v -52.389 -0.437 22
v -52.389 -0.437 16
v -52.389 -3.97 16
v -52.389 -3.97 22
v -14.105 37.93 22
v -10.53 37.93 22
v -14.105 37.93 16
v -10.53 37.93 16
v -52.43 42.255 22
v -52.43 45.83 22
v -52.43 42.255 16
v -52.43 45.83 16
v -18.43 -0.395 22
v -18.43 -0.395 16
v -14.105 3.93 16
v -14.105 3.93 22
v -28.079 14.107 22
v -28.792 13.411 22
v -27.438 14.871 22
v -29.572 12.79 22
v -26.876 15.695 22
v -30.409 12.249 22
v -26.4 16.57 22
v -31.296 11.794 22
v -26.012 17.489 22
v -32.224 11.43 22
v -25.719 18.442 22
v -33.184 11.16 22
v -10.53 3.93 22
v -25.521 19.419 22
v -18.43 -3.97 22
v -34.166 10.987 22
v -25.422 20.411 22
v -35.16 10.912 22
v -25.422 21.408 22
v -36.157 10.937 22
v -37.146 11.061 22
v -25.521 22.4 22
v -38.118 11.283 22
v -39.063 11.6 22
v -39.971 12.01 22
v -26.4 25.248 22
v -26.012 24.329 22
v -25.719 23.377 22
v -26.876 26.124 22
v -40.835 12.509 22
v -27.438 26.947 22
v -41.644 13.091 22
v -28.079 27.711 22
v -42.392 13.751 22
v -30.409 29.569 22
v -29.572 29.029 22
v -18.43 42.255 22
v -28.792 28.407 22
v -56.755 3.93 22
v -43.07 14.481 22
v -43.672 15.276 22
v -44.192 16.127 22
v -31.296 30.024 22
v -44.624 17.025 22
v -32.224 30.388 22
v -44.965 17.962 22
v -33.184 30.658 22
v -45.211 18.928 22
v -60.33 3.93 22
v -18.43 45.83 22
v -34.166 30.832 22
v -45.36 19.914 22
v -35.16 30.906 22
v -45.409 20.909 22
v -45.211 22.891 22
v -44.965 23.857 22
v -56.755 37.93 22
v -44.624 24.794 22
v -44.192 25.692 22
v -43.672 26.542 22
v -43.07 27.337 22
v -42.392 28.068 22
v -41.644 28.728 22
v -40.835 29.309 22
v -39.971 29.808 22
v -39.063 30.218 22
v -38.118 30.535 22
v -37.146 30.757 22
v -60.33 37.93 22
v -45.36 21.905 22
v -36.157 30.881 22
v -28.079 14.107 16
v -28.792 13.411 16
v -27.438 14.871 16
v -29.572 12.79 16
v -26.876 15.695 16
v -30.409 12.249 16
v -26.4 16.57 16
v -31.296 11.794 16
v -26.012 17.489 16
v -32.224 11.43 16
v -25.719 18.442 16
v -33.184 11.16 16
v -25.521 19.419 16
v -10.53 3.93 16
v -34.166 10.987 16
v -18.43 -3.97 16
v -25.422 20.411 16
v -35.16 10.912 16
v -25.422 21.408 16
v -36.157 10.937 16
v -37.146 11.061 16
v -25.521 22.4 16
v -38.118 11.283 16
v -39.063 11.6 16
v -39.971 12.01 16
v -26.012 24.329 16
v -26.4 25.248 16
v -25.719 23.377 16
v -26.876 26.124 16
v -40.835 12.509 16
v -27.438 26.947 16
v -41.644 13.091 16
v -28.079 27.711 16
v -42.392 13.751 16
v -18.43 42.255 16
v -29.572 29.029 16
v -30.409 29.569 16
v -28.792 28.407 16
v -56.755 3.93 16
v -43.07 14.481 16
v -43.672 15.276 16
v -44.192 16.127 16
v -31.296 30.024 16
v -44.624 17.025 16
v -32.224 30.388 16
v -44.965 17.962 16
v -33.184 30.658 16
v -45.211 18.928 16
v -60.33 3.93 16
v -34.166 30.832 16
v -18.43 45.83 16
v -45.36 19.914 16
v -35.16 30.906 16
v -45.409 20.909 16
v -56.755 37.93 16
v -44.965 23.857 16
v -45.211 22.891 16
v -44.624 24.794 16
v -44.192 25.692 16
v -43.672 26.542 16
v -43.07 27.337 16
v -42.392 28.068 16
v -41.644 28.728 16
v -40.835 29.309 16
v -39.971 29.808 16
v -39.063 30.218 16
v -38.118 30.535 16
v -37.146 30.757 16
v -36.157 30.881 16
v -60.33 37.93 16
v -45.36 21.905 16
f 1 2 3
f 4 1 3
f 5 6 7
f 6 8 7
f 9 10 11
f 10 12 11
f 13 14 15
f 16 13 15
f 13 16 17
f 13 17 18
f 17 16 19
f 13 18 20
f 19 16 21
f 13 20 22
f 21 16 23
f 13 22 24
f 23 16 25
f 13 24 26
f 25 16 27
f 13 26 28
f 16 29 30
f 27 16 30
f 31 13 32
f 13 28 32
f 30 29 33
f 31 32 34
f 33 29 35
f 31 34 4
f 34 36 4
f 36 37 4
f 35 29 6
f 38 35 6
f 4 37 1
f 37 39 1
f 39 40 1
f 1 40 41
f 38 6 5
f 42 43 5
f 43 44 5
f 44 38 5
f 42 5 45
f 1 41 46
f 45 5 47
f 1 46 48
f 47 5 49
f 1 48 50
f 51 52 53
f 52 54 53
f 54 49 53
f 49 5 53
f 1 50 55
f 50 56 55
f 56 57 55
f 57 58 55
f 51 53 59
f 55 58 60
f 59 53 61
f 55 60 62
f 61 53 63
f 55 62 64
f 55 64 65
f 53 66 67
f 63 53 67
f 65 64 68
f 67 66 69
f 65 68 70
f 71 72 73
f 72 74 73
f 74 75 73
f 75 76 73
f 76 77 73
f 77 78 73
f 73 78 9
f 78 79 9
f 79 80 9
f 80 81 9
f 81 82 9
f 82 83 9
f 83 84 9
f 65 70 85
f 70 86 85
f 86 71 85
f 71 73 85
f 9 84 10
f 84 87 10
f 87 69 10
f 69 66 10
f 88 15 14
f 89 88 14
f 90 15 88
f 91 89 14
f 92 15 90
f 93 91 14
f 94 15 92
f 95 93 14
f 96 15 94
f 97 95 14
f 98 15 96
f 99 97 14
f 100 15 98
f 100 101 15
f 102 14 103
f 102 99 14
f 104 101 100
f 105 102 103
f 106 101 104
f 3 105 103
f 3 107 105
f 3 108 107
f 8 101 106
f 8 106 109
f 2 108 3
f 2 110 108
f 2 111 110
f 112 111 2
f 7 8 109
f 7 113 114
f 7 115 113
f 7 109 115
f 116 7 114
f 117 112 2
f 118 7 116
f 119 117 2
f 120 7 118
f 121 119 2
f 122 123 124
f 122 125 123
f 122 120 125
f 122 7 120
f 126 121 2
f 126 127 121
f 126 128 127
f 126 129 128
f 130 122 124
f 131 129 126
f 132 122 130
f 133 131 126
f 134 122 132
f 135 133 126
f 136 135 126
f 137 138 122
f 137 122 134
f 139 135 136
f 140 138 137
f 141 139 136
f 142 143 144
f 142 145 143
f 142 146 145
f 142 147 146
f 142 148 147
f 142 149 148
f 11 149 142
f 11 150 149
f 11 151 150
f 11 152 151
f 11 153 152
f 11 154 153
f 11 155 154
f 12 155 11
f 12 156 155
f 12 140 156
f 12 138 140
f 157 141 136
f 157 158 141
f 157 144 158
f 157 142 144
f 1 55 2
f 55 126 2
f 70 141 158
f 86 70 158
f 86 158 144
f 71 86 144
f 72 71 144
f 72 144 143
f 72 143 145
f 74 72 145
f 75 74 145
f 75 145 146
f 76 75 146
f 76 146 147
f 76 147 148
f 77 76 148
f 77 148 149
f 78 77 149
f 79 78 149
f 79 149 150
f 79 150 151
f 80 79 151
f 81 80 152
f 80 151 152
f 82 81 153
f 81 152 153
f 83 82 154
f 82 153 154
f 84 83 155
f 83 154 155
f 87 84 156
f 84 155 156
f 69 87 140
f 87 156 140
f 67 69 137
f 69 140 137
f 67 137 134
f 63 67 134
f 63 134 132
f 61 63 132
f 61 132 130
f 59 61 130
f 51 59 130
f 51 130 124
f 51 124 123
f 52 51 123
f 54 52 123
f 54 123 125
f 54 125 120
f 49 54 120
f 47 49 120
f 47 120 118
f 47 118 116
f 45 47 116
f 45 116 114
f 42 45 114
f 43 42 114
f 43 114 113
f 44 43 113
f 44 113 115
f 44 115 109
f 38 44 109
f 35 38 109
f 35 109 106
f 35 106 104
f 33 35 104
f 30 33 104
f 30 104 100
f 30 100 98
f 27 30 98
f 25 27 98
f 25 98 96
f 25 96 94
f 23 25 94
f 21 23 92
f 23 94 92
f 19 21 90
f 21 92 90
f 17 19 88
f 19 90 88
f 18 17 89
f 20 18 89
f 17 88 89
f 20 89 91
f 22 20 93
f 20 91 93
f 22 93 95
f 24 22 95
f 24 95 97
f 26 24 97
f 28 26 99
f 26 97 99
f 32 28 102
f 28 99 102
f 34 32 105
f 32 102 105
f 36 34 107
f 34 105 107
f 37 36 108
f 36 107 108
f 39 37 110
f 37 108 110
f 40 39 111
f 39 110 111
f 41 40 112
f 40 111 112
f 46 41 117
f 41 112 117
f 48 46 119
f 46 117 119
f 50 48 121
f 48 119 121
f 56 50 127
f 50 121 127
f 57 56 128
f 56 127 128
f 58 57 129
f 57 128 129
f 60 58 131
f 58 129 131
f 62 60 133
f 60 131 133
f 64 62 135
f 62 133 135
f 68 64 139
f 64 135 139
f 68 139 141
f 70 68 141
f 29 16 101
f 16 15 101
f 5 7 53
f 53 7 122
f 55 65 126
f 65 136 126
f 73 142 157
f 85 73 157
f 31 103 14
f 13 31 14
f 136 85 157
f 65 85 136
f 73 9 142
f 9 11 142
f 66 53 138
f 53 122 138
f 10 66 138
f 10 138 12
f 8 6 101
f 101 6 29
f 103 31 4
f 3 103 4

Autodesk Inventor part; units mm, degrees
ref_plane "YZ Plane" through (0, 0, 0) normal (1, 0, 0) x (0, 1, 0)
ref_plane "XZ Plane" through (0, 0, 0) normal (0, 1, 0) x (-1, 0, 0)
ref_plane "Work Plane1" through (-56.3599, 0, 22) normal (0, 0, -1) x (-1, 0, 0)
sketch "Sketch1" plane through (-56.3599, 0, 22) normal (0, 0, -1) x (-1, 0, 0)
  line L0 (-4.0299, -0.3538) -> (-2.2322, 1.4439) construction
  arc A0 (-1.4439, 2.2322) -> (-2.2322, 1.4439) centre (-0.9299, 0.9299) ccw construction
  line L1 (-1.4439, 2.2322) -> (0.3538, 4.0299) construction
  line L2 (-37.8299, 42.8299) -> (-37.8299, 37.8299) construction
  line L3 (-37.8299, 37.8299) -> (-42.9208, 37.8299) construction
  line L4 (-37.8299, 42.2137) -> (-37.8299, 45.8299) construction
  line L5 (-37.8299, 45.8299) -> (-4.0299, 45.8299) construction
  line L6 (-4.0299, 45.8299) -> (-4.0299, 42.2137) construction
  line L7 (-4.0299, 4.0299) -> (0.3538, 4.0299) projected
  circle A1 centre (-20.9299, 20.9299) radius 17.5 projected
  line L8 (-20.9299, 58.9723) -> (17.1124, 20.9299) construction
  line L9 (17.1124, 20.9299) -> (-20.9299, -17.1124) construction
  line L10 (-20.9299, -17.1124) -> (-58.9723, 20.9299) construction
  line L11 (-58.9723, 20.9299) -> (-20.9299, 58.9723) construction
  line L12 (-20.9299, 58.9723) -> (-20.9299, -17.1124) construction
  line L13 (17.1124, 20.9299) -> (-58.9723, 20.9299) construction
  line L14 (-20.9299, 58.9723) -> (32.8701, 58.9723) construction
  line L15 (-43.4299, 43.4299) -> (1.5701, 43.4299) construction
  line L16 (1.5701, 43.4299) -> (1.5701, -1.5701) construction
  line L17 (1.5701, -1.5701) -> (-43.4299, -1.5701) construction
  line L18 (-43.4299, -1.5701) -> (-43.4299, 43.4299) construction
  line L19 (-43.4299, 43.4299) -> (1.5701, -1.5701) construction
  line L20 (1.5701, 43.4299) -> (-43.4299, -1.5701) construction
  line L21 (-43.4299, 5.3876) -> (-43.4299, 36.4723)
  line L22 (-43.4299, 36.4723) -> (-36.4723, 43.4299)
  line L23 (-36.4723, 43.4299) -> (-5.3876, 43.4299)
  line L24 (-5.3876, 43.4299) -> (1.5701, 36.4723)
  line L25 (1.5701, 36.4723) -> (1.5701, 5.3876)
  line L26 (1.5701, 5.3876) -> (-5.3876, -1.5701)
  line L27 (-5.3876, -1.5701) -> (-36.4723, -1.5701)
  line L28 (-36.4723, -1.5701) -> (-43.4299, 5.3876)
  line L29 (-4.0299, 42.2137) -> (-37.8299, 42.2137) projected
  line L30 (-4.0299, -0.3538) -> (-4.0299, 4.0299) projected
  circle A2 centre (-20.9299, 20.9299) radius 1.5
  line L31 (-10.9299, 10.9299) -> (-30.9299, 10.9299) construction
  line L32 (-30.9299, 10.9299) -> (-30.9299, 30.9299) construction
  line L33 (-30.9299, 30.9299) -> (-10.9299, 30.9299) construction
  line L34 (-10.9299, 30.9299) -> (-10.9299, 10.9299) construction
  line L35 (-10.9299, 10.9299) -> (-30.9299, 30.9299) construction
  line L36 (-30.9299, 10.9299) -> (-10.9299, 30.9299) construction
  circle A3 centre (-30.9299, 30.9299) radius 1.4
  circle A4 centre (-30.9299, 10.9299) radius 1.4
  circle A5 centre (-10.9299, 10.9299) radius 1.4
  line L37 (-45.8299, 37.8299) -> (-42.0723, 37.8299) construction
  line L38 (-42.1723, 37.7299) -> (-45.8299, 37.7299)
  line L39 (-45.8299, 37.7299) -> (-45.8299, 4.1299)
  line L40 (-45.8299, 4.1299) -> (-42.1723, 4.1299)
  line L41 (-42.1723, 4.1299) -> (-42.1723, 37.7299)
  line L42 (-45.8299, 4.0299) -> (-42.0723, 4.0299) construction
  line L43 (-45.8299, 37.8299) -> (-42.0723, 37.8299) projected
  line L44 (-37.7299, 45.8299) -> (-4.1299, 45.8299)
  line L45 (-4.1299, 45.8299) -> (-4.1299, 42.1723)
  line L46 (-4.1299, 42.1723) -> (-37.7299, 42.1723)
  line L47 (-37.7299, 42.1723) -> (-37.7299, 45.8299)
  line L48 (0.4701, 37.8299) -> (0.4701, 4.0299) construction
  line L49 (0.4701, 4.0299) -> (3.9701, 4.0299) construction
  line L50 (3.9701, 37.8299) -> (3.9701, 4.0299) construction
  line L51 (0.4701, 37.8299) -> (3.9701, 37.8299) construction
  line L52 (-45.8299, -3.9701) -> (-4.0299, -3.9701) construction
  line L53 (0.3124, 37.7299) -> (3.9701, 37.7299)
  line L54 (3.9701, 37.7299) -> (3.9701, 4.1299)
  line L55 (3.9701, 4.1299) -> (0.3124, 4.1299)
  line L56 (0.3124, 4.1299) -> (0.3124, 37.7299)
  line L57 (-4.1713, -0.3538) -> (-37.7299, -0.3538)
  line L58 (-37.7299, -0.3538) -> (-37.7299, -3.9701)
  line L59 (-37.7299, -3.9701) -> (-4.1713, -3.9701)
  line L60 (-4.1713, -3.9701) -> (-4.1713, -0.3538)
  point P0 (-37.8299, 4.0299)
  dimension "d18" = 53.8
  dimension "d19" = 45
  dimension "d20" = 53.8
  dimension "d21" = 45
  dimension "d22" = 45
  dimension "d30" = 20
  dimension "d31" = 20
  dimension "d32" = 2.8
  dimension "d33" = 2.8
  dimension "d34" = 2.8
  dimension "d35" = 3
  dimension "d36" = 0.1
  dimension "d37" = 0.1
  dimension "d38" = 0.1
  dimension "d39" = 0.1
extrude "Extrusion1" add sketch "Sketch1" along normal blind 6 contours L30 L26 L57 L28 L41 L22 L46 L24 L56 L7 | L7 L26 L30 | L56 L24 L25 L26 | L26 L25 L24 L53 L54 L55 | L60 L59 L58 L57 L28 L27 L26 | L26 L27 L28 L57 | L46 L22 L29 L24 | L24 L29 L45 | L40 L39 L38 L22 L21 L28 | L28 L21 L22 L41 | L29 L22 L23 L24 | L24 L23 L22 L29 L47 L44 L45 | L47 L29 L22 | A1 | A2 | A3 | A4 | A5
sketch "Skizze4" plane through (-56.3599, 0, 16) normal (0, 0, -1) x (-1, 0, 0)
  line L0 (-37.7299, 42.1723) -> (-42.1723, 37.7299) projected
  line L1 (-42.1723, 37.7299) -> (-45.8299, 37.7299) projected
  line L2 (-45.8299, 37.7299) -> (-45.8299, 4.1299) construction
  line L3 (-45.8299, 4.1299) -> (-42.1723, 4.1299) projected
  line L4 (-42.1723, 4.1299) -> (-37.6885, -0.3538) projected
  line L5 (-37.6885, -0.3538) -> (-37.7299, -0.3538) projected
  line L6 (-37.7299, -0.3538) -> (-37.7299, -3.9701) projected
  line L7 (-37.7299, -3.9701) -> (-4.1713, -3.9701) construction
  line L8 (-4.1713, -3.9701) -> (-4.1713, -0.3538) projected
  line L9 (-4.1713, -0.3538) -> (0.3124, 4.1299) projected
  line L10 (0.3124, 4.1299) -> (3.9701, 4.1299) projected
  line L11 (3.9701, 4.1299) -> (3.9701, 37.7299) construction
  line L12 (3.9701, 37.7299) -> (0.3124, 37.7299) projected
  line L13 (0.3124, 37.7299) -> (-4.1299, 42.1723) projected
  line L14 (-4.1299, 42.1723) -> (-4.1299, 45.8299) projected
  line L15 (-4.1299, 45.8299) -> (-37.7299, 45.8299) construction
  line L16 (-37.7299, 45.8299) -> (-37.7299, 42.1723) projected
  line L17 (-37.9299, 46.0299) -> (-3.9299, 46.0299) construction
  line L18 (-3.9299, 46.0299) -> (-3.9299, 42.2551)
  line L19 (-3.9299, 42.2551) -> (0.3953, 37.9299)
  line L20 (0.3953, 37.9299) -> (4.1701, 37.9299)
  line L21 (4.1701, 37.9299) -> (4.1701, 3.9299) construction
  line L22 (4.1701, 3.9299) -> (0.3953, 3.9299)
  line L23 (0.3953, 3.9299) -> (-3.9713, -0.4367)
  line L24 (-3.9713, -0.4367) -> (-3.9713, -4.1701)
  line L25 (-3.9713, -4.1701) -> (-37.9299, -4.1701) construction
  line L26 (-37.9299, -4.1701) -> (-37.9299, -0.3953)
  line L27 (-37.9299, -0.3953) -> (-42.2551, 3.9299)
  line L28 (-42.2551, 3.9299) -> (-46.0299, 3.9299)
  line L29 (-46.0299, 3.9299) -> (-46.0299, 37.9299) construction
  line L30 (-46.0299, 37.9299) -> (-42.2551, 37.9299)
  line L31 (-42.2551, 37.9299) -> (-37.9299, 42.2551)
  line L32 (-37.9299, 42.2551) -> (-37.9299, 46.0299)
  line L33 (-45.8299, 37.7299) -> (-45.8299, 37.9299)
  line L34 (-4.1299, 45.8299) -> (-37.7299, 45.8299) projected
  line L35 (-37.7299, 45.8299) -> (-37.9299, 45.8299)
  line L36 (-4.1299, 45.8299) -> (-3.9299, 45.8299)
  line L37 (3.9701, 37.7299) -> (3.9701, 37.9299)
  line L38 (3.9701, 4.1299) -> (3.9701, 37.7299) projected
  line L39 (3.9701, 4.1299) -> (3.9701, 3.9299)
  line L40 (-4.1713, -3.9701) -> (-3.9713, -3.9701)
  line L41 (-37.7299, -3.9701) -> (-37.9299, -3.9701)
  line L42 (-45.8299, 4.1299) -> (-45.8299, 3.9299)
  point P0 (-56.3599, 0)
  dimension "d40" = 0.2
extrude "IM_offset" add sketch "Skizze4" against normal up to surface (6 mm away)
ref_plane "Arbeitsebene5" through (-35.4299, 3.9299, 22) normal (-1, 0, 0) x (0, 0, 1)
ref_plane "Arbeitsebene6" through (-18.4299, 20.9299, 22) normal (0, 1, 0) x (-1, 0, 0)
sketch "Skizze31" plane through (-56.3599, 0, 16) normal (0, 0, -1) x (-1, 0, 0)
  line L0 (3.9701, 3.9299) -> (3.9701, 37.9299) projected
  line L1 (3.9701, 37.9299) -> (0.3953, 37.9299) projected
  line L2 (0.3953, 37.9299) -> (-3.9299, 42.2551) projected
  line L3 (-3.9299, 42.2551) -> (-3.9299, 45.8299) projected
  line L4 (-3.9299, 45.8299) -> (-37.9299, 45.8299) projected
  line L5 (-37.9299, 45.8299) -> (-37.9299, 42.2551) projected
  line L6 (-37.9299, 42.2551) -> (-42.2551, 37.9299) projected
  line L7 (-42.2551, 37.9299) -> (-45.8299, 37.9299) projected
  line L8 (-45.8299, 37.9299) -> (-45.8299, 3.9299) projected
  line L9 (-42.2551, 3.9299) -> (-45.8299, 3.9299) projected
  line L10 (-37.9299, -0.3953) -> (-42.2551, 3.9299) projected
  line L11 (-37.9299, -3.9701) -> (-37.9299, -0.3953) projected
  line L12 (-3.9713, -3.9701) -> (-37.9299, -3.9701) projected
  line L13 (-3.9713, -3.9701) -> (-3.9713, -0.4367) projected
  line L14 (-3.9713, -0.4367) -> (0.3953, 3.9299) projected
  line L15 (0.3953, 3.9299) -> (3.9701, 3.9299) projected
  circle A0 centre (-20.9506, 20.9092) radius 10
  point P0 (-56.3599, 0)
  dimension "d181" = 20
extrude "Extrusion26" cut sketch "Skizze31" against normal blind 10 contours A0
properties part number "20_Cube_Insert_Filter_25mm"
